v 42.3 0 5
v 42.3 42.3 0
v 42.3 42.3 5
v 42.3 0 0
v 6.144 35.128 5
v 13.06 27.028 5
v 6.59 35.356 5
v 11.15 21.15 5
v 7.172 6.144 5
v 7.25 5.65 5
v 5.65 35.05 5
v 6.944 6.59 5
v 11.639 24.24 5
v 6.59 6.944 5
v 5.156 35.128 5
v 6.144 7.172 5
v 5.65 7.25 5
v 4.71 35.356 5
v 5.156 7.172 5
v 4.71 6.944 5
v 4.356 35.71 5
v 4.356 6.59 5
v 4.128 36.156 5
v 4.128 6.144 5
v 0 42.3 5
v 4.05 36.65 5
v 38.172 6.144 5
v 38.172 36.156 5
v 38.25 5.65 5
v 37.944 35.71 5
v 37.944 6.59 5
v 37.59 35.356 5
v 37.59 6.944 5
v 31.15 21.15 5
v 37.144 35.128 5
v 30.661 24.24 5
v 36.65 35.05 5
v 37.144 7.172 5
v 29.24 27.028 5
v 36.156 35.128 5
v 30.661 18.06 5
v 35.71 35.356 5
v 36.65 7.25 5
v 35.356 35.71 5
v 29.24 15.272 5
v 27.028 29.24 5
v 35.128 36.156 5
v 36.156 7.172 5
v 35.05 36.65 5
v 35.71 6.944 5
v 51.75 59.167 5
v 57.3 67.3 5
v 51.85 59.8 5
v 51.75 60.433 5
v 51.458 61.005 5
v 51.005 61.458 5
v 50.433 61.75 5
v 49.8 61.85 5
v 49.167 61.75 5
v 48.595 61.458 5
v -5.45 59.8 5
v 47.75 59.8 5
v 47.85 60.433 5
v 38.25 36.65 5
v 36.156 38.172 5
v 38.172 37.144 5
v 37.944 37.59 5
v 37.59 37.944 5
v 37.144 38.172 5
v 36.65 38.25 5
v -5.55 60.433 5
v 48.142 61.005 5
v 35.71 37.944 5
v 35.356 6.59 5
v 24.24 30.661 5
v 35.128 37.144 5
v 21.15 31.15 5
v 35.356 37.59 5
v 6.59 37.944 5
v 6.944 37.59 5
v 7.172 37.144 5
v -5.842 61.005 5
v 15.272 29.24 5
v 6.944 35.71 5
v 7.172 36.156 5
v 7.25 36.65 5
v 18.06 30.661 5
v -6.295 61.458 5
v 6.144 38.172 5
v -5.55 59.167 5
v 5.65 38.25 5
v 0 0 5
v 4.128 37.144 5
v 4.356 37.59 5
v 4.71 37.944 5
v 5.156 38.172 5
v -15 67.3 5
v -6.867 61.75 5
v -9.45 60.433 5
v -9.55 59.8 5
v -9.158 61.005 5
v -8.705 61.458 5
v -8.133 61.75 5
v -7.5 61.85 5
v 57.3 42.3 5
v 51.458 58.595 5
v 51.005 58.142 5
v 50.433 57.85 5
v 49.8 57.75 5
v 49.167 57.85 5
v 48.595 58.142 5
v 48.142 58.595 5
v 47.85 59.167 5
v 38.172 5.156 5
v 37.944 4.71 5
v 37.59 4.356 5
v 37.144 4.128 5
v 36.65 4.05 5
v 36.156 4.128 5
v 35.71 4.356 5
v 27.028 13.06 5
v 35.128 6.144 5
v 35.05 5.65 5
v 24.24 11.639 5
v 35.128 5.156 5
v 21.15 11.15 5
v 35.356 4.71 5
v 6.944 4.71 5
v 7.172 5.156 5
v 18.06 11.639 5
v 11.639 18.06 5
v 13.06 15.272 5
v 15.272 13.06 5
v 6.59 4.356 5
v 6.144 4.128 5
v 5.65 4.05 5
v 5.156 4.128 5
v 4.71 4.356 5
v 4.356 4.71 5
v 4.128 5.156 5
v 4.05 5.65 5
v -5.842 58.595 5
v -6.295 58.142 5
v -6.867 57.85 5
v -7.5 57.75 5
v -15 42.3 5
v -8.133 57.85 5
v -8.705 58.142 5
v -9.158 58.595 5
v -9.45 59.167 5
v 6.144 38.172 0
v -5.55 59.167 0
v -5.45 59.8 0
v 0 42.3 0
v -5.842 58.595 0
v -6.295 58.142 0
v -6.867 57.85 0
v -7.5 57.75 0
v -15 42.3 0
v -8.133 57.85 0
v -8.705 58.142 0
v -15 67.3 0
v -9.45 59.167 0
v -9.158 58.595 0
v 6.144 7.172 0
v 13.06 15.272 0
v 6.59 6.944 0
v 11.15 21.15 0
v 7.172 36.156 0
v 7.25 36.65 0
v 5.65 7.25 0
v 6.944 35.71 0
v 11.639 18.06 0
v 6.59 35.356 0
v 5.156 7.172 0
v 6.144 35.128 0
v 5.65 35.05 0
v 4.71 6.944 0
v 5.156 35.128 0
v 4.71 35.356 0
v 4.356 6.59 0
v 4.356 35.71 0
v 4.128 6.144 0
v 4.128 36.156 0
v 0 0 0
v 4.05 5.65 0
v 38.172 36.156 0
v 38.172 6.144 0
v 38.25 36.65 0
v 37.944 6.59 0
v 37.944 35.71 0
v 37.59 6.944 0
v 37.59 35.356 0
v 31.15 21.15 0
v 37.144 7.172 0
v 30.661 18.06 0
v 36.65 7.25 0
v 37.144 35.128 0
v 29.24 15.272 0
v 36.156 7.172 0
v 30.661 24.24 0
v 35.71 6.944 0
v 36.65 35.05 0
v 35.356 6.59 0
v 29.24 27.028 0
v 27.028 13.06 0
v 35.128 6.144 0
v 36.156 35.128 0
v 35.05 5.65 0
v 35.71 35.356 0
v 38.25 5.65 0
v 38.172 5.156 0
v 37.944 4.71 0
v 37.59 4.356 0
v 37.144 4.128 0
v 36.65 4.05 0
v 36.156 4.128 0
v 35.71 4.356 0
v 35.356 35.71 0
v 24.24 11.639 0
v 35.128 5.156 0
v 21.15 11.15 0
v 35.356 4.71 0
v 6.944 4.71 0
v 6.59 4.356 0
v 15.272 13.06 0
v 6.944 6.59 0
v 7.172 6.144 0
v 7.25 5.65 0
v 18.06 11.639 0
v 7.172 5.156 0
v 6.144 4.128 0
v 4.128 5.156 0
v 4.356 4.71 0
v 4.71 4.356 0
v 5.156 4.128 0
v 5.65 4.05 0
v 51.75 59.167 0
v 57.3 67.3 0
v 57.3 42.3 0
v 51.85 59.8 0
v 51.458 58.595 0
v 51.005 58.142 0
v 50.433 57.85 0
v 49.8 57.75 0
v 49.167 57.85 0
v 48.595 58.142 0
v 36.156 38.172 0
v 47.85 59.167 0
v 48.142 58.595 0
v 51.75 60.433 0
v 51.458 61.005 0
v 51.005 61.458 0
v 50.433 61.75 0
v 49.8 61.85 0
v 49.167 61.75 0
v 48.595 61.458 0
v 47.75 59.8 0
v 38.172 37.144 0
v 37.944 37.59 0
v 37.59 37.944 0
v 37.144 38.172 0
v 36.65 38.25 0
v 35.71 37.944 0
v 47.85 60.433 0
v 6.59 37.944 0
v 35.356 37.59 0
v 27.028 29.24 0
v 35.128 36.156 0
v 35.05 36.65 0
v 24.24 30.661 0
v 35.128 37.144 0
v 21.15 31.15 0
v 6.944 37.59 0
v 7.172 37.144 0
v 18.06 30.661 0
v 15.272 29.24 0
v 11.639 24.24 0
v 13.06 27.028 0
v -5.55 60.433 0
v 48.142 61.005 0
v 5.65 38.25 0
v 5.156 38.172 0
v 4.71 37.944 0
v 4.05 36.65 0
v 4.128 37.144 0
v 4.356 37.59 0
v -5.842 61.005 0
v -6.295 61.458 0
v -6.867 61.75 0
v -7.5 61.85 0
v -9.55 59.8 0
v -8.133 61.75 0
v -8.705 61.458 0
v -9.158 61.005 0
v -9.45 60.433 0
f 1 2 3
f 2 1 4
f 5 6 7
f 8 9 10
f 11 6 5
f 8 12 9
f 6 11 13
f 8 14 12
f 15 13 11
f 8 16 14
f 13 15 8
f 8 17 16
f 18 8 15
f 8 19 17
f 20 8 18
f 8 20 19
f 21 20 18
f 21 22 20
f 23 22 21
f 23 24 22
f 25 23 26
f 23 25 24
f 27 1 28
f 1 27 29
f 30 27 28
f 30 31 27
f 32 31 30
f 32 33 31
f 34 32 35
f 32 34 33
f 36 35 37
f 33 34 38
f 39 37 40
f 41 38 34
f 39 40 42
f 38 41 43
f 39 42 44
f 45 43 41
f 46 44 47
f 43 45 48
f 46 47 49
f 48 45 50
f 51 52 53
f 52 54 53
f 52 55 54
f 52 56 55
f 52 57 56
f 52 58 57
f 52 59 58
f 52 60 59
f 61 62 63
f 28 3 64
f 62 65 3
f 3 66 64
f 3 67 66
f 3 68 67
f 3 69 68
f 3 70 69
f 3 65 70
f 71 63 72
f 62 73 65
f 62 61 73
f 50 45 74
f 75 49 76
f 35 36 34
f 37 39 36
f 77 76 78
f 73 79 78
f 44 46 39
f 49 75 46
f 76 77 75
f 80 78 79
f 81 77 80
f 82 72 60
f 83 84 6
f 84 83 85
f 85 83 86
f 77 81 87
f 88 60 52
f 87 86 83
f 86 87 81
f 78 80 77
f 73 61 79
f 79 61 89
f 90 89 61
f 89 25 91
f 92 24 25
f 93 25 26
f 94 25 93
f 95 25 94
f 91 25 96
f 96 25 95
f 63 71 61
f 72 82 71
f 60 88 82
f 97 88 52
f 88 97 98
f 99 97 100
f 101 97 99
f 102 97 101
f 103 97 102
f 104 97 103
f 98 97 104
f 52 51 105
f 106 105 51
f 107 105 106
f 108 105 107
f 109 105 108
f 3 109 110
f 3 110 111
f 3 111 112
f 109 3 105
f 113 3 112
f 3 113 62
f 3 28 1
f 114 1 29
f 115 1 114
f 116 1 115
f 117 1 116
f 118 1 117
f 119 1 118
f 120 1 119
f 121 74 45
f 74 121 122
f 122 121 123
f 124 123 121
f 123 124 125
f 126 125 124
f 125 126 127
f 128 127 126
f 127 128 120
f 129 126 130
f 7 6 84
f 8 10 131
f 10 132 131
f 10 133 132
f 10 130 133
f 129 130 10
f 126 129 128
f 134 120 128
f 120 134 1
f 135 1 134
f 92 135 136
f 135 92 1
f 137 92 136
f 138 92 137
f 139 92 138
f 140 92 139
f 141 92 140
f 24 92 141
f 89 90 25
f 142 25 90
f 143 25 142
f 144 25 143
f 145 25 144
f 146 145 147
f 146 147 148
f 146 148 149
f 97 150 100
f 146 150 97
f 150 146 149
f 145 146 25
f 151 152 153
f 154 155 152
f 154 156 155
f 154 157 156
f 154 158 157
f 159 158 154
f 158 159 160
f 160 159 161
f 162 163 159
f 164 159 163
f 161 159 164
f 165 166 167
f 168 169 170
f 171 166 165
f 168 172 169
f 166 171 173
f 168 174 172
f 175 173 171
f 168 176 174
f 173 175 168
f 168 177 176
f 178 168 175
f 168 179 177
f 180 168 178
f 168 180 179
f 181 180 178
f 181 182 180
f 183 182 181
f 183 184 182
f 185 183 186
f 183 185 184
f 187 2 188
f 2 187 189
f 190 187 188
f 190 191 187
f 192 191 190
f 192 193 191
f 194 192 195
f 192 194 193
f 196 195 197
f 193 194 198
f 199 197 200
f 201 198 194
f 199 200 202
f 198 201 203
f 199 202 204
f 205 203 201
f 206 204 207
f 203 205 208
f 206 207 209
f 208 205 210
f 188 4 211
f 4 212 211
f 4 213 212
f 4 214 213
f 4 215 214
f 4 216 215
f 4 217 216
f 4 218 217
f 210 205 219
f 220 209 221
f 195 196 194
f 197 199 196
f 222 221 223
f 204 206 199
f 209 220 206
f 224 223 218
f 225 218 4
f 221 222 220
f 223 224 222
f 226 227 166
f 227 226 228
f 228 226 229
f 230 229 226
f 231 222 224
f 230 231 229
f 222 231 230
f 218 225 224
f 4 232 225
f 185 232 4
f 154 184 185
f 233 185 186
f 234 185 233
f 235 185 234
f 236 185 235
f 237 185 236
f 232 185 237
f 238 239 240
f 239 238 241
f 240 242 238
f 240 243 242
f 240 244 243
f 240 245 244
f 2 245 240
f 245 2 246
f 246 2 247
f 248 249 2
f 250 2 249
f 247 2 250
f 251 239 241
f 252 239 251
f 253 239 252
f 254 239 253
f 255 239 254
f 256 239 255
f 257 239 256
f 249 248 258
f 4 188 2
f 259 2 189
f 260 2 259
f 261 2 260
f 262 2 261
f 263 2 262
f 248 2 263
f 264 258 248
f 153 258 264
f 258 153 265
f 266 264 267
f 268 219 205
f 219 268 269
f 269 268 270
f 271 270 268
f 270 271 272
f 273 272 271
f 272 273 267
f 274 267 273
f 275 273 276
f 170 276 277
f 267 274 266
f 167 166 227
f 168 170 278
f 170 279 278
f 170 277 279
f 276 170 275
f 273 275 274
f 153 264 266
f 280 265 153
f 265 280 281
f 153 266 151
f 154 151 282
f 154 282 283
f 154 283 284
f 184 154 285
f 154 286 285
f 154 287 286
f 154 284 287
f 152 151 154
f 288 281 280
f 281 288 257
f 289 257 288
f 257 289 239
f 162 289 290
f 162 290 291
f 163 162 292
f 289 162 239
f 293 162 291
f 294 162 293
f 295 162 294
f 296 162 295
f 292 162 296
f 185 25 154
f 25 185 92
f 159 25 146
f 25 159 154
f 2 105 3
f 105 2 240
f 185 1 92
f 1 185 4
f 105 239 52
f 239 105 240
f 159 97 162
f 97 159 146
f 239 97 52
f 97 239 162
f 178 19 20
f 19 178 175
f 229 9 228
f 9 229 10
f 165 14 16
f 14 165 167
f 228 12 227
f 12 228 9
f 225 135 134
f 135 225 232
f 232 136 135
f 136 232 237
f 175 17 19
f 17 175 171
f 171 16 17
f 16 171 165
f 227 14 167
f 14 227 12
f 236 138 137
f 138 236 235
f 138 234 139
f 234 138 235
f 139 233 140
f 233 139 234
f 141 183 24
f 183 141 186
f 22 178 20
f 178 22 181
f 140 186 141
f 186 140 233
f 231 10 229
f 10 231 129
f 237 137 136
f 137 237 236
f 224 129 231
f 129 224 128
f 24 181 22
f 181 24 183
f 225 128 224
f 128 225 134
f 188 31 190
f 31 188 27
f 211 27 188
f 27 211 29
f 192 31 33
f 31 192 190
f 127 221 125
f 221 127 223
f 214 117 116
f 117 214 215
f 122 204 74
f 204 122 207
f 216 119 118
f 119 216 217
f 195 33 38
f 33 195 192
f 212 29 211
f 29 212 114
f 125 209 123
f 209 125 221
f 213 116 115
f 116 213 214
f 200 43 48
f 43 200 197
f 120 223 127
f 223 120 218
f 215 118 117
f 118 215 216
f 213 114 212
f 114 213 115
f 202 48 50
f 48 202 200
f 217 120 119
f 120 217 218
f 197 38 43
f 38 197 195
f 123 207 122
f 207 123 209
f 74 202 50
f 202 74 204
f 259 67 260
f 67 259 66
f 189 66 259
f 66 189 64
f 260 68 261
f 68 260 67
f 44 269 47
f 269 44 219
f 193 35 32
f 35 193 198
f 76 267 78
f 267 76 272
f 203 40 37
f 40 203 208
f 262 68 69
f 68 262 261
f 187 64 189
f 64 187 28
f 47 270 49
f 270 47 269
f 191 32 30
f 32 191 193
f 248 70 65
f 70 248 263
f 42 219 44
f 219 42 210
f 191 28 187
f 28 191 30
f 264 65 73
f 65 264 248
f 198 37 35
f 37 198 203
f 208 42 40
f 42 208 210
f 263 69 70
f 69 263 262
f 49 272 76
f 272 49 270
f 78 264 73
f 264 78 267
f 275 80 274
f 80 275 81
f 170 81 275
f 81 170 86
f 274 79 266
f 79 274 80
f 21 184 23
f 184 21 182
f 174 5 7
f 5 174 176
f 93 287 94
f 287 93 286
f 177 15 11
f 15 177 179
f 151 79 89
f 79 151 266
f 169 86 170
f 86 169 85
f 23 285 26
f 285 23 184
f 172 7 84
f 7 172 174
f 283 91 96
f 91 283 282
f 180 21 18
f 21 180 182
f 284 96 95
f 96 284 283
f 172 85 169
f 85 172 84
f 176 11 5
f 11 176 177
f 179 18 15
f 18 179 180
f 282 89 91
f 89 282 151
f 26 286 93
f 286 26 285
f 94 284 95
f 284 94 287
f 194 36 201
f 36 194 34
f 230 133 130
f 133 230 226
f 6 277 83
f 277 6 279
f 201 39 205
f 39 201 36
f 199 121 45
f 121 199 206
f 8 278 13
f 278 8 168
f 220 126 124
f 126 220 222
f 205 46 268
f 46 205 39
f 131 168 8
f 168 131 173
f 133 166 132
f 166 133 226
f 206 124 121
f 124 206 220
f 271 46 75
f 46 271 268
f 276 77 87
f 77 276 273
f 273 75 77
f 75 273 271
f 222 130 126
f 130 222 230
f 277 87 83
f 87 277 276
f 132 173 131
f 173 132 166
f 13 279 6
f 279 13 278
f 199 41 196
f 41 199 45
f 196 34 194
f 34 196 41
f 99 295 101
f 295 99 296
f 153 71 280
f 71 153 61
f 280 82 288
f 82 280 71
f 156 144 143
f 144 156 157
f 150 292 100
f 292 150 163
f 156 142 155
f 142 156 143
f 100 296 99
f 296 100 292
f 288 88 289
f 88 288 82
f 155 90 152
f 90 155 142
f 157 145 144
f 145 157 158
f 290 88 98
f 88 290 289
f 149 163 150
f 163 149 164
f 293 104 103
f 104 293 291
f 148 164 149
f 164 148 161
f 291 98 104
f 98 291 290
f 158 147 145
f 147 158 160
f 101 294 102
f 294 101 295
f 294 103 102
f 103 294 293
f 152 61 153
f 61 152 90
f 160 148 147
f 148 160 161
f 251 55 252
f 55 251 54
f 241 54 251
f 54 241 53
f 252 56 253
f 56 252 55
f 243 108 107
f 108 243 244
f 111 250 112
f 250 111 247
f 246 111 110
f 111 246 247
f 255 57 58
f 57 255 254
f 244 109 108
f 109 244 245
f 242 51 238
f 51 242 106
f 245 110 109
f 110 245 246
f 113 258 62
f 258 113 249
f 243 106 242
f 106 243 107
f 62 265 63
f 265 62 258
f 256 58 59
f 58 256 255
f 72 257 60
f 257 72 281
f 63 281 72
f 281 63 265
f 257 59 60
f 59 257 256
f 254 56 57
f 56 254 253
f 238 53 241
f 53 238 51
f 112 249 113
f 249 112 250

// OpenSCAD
difference(){
    union(){
        cube([42.3,42.3,5]);
        translate([-15,42.3,0]){
            cube([72.3,25,5]);
        }
    }
    translate([5.65, 5.65,0]){
        cylinder(d=3.2, 5,$fn=20);
    }
    translate([5.65+31, 5.65,0]){
        cylinder(d=3.2, 5,$fn=20);
    }
    translate([5.65+31, 5.65+31,0]){
        cylinder(d=3.2, 5,$fn=20);
    }
    translate([5.65, 5.65+31,0]){
        cylinder(d=3.2, 5,$fn=20);
    }
    translate([42.3/2, 42.3/2,0]){
        cylinder(d=20, 5,$fn=20);
    }
    translate([-7.5, 42.3+7.5+10,0]){
        cylinder(d=4.1, 5,$fn=20);
    }
    translate([42.3+7.5, 42.3+7.5+10,0]){
        cylinder(d=4.1, 5,$fn=20);
    }
}
